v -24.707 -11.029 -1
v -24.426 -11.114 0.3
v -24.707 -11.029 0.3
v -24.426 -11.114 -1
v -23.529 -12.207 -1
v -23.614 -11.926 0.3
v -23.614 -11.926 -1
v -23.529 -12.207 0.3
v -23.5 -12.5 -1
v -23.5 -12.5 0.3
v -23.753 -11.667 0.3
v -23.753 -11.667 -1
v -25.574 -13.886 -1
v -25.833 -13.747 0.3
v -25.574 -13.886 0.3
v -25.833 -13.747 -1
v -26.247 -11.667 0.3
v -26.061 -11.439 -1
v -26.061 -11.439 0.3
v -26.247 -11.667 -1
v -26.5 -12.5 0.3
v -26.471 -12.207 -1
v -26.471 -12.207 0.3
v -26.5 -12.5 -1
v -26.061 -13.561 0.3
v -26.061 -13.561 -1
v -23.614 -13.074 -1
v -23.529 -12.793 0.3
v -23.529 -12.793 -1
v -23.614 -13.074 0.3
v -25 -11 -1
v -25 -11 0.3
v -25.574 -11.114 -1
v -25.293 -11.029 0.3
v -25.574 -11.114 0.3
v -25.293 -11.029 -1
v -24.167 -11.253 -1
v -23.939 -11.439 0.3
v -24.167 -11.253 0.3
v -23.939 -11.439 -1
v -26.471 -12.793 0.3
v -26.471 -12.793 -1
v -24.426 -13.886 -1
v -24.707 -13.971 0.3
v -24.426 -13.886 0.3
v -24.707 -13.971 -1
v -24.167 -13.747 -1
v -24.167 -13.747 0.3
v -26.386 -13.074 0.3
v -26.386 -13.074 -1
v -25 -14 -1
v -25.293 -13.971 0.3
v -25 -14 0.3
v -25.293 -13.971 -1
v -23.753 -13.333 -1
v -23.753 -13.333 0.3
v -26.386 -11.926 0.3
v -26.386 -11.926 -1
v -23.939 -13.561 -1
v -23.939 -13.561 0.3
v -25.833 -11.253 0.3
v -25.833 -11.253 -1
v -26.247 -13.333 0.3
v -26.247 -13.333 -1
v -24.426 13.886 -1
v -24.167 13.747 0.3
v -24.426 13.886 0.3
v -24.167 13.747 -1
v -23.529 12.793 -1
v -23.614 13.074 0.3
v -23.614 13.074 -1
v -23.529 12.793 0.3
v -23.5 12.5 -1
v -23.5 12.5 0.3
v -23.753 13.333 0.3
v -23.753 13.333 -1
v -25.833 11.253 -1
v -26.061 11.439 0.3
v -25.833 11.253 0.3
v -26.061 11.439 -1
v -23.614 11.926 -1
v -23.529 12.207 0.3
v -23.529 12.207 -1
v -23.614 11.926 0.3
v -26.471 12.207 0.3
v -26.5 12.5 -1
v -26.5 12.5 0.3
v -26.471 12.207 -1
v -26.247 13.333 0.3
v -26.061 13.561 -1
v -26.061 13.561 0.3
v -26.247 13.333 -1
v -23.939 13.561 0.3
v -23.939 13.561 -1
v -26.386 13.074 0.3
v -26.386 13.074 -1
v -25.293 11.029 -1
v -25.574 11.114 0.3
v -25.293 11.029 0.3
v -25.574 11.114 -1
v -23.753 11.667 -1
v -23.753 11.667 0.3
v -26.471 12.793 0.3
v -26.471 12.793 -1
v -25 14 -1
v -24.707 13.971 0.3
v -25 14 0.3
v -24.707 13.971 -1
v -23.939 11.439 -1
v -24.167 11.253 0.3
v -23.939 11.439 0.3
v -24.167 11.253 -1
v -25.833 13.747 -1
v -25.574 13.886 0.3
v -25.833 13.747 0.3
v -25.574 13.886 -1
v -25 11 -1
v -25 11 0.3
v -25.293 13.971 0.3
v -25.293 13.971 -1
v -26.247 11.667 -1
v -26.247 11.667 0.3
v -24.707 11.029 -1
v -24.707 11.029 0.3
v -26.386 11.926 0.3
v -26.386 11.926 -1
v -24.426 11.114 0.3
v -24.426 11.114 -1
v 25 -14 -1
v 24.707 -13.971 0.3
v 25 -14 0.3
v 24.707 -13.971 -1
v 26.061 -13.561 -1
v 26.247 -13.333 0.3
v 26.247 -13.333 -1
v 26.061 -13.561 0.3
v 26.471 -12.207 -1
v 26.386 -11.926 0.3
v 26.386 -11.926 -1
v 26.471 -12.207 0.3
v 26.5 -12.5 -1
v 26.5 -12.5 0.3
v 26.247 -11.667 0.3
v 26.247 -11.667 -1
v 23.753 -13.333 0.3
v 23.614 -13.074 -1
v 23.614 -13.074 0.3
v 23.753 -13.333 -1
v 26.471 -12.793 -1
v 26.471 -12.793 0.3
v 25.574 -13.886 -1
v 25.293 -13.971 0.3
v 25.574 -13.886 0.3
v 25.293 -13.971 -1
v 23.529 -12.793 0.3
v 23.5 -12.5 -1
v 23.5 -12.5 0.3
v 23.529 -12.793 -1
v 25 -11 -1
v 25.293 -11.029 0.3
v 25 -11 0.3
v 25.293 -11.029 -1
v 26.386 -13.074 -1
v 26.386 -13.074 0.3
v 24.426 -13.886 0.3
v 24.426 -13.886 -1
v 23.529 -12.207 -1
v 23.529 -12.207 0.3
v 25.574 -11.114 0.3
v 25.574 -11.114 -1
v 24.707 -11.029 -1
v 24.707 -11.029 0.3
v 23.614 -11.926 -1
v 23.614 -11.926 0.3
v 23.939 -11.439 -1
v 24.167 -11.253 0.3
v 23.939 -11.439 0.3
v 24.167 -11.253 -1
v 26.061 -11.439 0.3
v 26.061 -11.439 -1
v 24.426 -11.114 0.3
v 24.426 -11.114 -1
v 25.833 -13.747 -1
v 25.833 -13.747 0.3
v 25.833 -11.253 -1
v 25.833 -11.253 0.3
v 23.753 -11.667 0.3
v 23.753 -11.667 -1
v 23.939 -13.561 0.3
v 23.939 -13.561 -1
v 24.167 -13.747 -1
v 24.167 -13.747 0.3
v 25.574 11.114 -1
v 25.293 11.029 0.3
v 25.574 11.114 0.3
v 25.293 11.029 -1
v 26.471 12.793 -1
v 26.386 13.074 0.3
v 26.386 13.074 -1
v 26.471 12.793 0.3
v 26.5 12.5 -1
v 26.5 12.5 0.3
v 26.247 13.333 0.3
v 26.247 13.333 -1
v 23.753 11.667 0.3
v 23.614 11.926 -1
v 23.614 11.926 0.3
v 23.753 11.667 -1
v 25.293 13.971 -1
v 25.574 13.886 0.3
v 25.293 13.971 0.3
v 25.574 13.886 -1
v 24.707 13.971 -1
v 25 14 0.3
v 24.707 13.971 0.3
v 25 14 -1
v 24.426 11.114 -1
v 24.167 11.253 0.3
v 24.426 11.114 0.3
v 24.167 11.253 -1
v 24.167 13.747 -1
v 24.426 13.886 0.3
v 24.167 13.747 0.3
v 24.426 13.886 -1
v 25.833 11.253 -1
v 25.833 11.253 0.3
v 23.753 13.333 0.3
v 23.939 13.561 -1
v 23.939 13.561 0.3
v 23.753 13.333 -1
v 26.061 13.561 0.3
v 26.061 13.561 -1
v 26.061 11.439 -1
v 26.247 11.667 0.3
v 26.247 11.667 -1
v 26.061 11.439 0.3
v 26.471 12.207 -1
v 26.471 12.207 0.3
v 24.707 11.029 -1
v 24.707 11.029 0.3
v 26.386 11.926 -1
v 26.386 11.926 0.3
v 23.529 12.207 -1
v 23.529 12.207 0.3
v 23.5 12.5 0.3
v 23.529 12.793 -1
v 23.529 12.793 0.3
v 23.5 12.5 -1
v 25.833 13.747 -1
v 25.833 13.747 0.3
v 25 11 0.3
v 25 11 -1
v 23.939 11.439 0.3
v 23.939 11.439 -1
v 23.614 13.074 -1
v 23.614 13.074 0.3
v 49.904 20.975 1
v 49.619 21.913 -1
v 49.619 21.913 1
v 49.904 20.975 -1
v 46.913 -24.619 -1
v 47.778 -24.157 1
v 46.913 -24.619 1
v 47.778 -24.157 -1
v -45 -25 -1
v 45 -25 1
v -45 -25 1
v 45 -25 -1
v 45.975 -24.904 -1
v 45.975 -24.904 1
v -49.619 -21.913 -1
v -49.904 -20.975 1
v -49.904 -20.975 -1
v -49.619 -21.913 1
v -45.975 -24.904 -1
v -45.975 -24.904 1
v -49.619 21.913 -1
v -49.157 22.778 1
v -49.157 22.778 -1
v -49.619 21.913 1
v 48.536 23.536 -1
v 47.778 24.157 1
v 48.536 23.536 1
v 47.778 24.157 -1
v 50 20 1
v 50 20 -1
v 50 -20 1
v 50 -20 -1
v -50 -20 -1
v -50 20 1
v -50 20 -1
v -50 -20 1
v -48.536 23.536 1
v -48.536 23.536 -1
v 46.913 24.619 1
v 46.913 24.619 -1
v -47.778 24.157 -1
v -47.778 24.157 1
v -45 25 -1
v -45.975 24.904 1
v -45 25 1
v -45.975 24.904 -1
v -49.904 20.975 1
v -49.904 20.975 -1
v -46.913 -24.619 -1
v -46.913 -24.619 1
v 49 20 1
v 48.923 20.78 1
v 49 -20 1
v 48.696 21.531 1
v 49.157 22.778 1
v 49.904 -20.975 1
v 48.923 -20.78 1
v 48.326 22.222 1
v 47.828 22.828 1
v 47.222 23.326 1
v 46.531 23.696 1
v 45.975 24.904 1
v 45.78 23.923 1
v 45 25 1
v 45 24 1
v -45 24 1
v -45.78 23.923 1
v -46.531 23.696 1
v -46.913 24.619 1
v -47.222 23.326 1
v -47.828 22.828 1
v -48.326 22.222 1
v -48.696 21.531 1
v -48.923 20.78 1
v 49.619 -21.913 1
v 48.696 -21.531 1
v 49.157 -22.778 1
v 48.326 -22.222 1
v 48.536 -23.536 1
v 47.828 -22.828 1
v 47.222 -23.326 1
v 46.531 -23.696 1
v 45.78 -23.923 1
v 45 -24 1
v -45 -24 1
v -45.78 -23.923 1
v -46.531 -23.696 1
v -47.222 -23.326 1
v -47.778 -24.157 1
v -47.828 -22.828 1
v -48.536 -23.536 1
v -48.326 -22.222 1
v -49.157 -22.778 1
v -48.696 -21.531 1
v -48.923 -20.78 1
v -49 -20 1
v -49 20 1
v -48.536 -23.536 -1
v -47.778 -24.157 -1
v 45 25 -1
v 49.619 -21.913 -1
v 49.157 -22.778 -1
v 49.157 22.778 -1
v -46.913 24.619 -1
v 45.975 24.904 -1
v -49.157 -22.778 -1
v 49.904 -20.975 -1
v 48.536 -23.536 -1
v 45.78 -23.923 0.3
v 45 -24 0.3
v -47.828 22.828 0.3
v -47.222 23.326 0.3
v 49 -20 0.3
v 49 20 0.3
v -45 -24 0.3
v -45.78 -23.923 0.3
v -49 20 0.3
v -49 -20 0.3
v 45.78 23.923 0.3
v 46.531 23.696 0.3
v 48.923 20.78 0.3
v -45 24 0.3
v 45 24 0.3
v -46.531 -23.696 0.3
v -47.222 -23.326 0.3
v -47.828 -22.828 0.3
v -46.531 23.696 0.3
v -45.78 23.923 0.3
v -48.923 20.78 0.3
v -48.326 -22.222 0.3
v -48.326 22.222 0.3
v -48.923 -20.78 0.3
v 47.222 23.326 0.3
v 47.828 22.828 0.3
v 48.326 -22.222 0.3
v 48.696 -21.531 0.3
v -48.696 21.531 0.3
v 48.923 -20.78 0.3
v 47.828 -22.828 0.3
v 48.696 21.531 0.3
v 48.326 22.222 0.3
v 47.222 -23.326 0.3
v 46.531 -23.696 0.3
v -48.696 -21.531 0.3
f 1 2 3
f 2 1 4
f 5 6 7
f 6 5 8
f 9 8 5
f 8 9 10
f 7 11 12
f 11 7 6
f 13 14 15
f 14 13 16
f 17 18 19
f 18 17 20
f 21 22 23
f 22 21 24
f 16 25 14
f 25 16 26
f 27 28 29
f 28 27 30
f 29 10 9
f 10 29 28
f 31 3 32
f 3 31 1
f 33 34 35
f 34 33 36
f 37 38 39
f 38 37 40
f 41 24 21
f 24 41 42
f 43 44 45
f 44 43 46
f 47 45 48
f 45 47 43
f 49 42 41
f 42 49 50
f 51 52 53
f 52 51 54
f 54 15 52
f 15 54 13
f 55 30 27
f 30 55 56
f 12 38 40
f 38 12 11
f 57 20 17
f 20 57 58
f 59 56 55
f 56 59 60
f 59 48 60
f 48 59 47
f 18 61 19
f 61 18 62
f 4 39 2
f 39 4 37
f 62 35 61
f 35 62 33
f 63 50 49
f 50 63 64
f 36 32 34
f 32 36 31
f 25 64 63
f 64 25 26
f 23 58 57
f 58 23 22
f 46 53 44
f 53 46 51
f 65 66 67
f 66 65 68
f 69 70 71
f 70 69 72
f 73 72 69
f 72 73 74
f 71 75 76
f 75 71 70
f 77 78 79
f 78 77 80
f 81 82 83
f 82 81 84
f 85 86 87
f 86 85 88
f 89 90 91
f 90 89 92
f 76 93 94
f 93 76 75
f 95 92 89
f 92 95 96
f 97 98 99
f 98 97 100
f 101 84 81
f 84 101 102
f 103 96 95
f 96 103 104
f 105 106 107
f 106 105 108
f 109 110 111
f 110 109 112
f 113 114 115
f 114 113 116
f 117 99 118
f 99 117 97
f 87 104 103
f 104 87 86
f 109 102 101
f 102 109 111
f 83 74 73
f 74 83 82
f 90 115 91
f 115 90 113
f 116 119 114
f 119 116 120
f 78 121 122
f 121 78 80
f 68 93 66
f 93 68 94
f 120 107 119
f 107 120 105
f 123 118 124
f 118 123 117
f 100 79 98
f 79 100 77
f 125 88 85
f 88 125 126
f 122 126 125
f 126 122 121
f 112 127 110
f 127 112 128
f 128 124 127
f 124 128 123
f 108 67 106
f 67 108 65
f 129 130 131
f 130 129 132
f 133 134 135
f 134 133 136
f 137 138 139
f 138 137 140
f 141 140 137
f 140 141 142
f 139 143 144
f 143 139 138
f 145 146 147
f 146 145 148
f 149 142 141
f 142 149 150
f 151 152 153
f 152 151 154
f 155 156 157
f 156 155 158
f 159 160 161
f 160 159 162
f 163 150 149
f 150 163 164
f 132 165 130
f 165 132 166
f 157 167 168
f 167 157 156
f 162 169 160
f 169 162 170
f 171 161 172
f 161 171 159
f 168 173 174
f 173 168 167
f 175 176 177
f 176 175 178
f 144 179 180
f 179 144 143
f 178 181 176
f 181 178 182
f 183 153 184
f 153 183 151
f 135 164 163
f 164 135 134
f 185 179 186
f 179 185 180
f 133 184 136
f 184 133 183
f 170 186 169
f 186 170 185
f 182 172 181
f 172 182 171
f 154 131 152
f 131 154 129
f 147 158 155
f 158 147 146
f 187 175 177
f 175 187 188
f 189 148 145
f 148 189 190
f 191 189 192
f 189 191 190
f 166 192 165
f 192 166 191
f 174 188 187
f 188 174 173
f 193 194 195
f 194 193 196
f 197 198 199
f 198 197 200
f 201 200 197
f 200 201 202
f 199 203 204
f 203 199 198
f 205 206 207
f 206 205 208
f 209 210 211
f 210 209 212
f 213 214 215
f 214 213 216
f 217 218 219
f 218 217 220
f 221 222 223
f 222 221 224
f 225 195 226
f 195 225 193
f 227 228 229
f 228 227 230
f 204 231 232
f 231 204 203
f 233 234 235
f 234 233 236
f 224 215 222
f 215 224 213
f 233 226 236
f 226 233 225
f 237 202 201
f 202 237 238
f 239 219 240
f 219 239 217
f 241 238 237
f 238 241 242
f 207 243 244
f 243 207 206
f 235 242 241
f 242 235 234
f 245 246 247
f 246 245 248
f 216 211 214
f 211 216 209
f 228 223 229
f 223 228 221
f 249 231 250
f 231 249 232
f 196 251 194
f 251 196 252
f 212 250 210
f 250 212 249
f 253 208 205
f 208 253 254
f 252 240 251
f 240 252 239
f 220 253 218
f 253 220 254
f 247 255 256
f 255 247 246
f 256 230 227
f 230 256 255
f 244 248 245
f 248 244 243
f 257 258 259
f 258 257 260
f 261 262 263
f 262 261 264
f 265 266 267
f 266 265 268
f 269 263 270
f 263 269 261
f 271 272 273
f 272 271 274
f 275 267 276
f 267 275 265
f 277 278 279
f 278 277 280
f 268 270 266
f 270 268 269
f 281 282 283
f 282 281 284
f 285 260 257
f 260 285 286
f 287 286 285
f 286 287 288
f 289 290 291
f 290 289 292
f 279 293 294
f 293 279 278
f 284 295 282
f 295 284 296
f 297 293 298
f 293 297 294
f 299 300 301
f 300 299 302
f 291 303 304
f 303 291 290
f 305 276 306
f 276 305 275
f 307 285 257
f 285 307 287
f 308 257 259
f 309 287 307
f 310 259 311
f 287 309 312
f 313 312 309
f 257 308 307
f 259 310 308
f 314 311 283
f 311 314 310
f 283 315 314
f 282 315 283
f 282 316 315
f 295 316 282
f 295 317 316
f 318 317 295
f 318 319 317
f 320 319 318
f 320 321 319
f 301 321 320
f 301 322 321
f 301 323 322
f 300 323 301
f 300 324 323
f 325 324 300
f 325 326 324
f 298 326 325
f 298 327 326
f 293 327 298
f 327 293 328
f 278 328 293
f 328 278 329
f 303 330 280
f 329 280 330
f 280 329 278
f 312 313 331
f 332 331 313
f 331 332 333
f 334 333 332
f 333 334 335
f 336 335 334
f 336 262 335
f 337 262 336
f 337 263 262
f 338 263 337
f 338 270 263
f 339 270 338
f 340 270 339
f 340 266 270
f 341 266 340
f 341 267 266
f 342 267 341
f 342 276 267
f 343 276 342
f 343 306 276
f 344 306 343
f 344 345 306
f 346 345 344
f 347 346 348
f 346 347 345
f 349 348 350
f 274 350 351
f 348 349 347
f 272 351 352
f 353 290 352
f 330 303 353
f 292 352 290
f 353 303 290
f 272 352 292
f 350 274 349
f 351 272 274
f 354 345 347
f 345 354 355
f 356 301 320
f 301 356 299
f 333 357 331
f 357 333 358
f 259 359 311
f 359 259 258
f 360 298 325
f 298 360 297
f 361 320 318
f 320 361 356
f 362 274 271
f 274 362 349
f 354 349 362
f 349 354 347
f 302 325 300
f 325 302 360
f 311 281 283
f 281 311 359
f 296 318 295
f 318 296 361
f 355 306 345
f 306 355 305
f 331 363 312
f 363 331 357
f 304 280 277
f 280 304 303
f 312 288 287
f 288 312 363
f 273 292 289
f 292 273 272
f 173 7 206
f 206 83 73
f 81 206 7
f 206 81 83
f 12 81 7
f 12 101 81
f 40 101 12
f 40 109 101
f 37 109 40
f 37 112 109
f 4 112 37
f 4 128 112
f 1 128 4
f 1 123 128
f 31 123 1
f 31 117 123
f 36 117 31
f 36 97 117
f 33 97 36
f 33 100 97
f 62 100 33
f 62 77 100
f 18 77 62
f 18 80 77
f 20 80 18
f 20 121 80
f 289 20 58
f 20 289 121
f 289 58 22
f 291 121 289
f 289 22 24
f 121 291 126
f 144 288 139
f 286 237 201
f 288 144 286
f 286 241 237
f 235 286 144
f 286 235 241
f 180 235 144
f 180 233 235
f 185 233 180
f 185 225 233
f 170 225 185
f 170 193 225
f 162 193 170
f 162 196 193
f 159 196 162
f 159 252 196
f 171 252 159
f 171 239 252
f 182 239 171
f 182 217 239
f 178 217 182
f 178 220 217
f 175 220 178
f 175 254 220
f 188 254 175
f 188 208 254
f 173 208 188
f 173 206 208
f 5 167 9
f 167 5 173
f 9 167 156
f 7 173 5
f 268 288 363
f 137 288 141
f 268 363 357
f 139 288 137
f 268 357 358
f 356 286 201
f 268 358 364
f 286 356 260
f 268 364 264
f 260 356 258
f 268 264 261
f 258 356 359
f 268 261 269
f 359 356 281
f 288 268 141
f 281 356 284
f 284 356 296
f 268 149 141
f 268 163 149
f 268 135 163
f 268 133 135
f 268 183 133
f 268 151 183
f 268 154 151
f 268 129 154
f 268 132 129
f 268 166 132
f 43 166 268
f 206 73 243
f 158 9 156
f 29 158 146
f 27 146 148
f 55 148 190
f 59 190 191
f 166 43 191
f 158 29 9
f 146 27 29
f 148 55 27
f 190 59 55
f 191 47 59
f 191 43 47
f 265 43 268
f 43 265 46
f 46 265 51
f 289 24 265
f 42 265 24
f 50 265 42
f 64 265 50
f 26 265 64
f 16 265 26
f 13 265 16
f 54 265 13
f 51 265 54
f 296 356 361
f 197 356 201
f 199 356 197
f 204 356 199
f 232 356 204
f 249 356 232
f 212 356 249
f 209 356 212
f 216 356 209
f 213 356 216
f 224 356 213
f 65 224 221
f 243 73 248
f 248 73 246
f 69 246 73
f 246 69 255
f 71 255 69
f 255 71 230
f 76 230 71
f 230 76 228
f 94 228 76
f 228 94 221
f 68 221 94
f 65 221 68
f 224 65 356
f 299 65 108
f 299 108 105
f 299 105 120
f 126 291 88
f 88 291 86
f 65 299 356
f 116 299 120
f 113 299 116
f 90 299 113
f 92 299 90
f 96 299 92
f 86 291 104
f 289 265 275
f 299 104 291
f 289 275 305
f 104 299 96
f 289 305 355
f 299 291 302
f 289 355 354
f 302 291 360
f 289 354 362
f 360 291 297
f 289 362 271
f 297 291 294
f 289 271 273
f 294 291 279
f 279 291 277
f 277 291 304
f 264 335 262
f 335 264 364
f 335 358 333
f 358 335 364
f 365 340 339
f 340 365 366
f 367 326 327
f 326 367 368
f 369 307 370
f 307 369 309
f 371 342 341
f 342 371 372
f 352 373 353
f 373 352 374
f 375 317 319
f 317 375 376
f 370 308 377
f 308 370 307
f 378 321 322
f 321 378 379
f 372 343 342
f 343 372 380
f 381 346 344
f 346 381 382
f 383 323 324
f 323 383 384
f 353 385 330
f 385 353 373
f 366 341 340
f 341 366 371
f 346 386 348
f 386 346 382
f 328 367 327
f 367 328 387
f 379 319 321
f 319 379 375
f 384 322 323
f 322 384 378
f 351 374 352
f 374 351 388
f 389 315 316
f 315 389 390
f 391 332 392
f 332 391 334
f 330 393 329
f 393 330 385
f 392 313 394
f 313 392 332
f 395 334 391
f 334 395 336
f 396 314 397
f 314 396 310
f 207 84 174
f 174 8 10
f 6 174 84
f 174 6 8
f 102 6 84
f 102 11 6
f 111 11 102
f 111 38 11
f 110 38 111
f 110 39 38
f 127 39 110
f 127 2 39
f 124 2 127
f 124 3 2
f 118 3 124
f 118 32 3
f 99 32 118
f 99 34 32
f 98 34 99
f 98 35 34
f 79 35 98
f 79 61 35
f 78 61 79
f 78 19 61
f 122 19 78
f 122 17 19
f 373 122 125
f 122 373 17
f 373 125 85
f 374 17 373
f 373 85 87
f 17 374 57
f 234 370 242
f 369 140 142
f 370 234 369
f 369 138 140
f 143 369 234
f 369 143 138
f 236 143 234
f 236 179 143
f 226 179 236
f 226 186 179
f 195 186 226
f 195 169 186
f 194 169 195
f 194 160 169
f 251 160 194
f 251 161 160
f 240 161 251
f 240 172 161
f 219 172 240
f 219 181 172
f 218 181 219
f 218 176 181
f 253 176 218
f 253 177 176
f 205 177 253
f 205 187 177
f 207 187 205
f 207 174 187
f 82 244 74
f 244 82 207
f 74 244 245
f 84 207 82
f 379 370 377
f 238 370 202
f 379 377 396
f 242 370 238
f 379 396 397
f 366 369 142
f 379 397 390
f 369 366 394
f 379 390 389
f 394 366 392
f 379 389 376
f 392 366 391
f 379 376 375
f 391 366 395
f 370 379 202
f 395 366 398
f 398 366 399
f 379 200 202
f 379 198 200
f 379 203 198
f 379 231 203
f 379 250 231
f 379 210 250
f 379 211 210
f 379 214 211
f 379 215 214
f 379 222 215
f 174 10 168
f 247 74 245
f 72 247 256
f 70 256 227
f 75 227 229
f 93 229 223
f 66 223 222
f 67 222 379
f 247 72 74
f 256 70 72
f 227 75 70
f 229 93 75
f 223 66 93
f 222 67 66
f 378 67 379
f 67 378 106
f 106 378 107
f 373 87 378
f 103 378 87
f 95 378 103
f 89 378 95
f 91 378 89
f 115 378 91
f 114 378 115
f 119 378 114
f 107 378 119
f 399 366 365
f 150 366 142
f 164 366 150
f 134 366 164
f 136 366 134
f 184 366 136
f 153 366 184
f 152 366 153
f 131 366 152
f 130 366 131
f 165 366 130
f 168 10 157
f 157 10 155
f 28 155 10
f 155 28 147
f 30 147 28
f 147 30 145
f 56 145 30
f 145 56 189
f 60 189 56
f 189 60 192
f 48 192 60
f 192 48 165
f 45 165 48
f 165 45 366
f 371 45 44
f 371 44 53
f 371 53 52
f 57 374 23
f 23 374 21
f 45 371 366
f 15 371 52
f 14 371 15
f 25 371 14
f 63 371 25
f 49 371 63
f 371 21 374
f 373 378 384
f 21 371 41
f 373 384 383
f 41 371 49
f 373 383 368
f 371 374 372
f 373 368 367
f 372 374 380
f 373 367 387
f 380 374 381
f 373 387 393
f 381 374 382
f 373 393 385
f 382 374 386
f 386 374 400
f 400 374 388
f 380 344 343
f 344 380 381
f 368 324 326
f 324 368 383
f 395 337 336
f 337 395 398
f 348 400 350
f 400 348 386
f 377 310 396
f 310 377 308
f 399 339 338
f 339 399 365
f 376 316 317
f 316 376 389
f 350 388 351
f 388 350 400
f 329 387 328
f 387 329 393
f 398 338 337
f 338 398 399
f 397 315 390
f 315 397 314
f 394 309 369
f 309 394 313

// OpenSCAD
// Parameters
sheet_length = 100;
sheet_width = 50;
sheet_thickness = 2;
corner_radius = 5;
hole_diameter = 3;
chamfer_size = 1; // simplified: used as a small edge inset (no 3D chamfer hull)

$fn = 32;

// 2D rounded rectangle (centered) using offset (fast)
module rounded_rect_2d(L, W, R) {
    R2 = min(R, min(L, W)/2);
    offset(r=R2)
        square([max(0.01, L - 2*R2), max(0.01, W - 2*R2)], center=true);
}

// Main sheet solid (3D)
module sheet_solid() {
    linear_extrude(height=sheet_thickness, center=true, convexity=5)
        rounded_rect_2d(sheet_length, sheet_width, corner_radius);
}

// Mounting holes (through)
module mounting_holes() {
    hole_h = sheet_thickness + 2; // ensure full cut
    for (x = [-sheet_length/4, sheet_length/4])
        for (y = [-sheet_width/4, sheet_width/4])
            translate([x, y, 0])
                cylinder(h=hole_h, d=hole_diameter, center=true);
}

// Simplified edge detail: shallow inset pocket on top face (fast, avoids hull)
module edge_inset_pocket() {
    inset = max(0, chamfer_size);
    if (inset > 0) {
        pocket_depth = min(sheet_thickness*0.35, inset); // shallow
        translate([0,0, sheet_thickness/2 - pocket_depth/2])
            linear_extrude(height=pocket_depth, center=true, convexity=5)
                rounded_rect_2d(
                    sheet_length - 2*inset,
                    sheet_width  - 2*inset,
                    max(corner_radius - inset, 0)
                );
    }
}

// Assemble
difference() {
    sheet_solid();
    mounting_holes();
    edge_inset_pocket();
}
